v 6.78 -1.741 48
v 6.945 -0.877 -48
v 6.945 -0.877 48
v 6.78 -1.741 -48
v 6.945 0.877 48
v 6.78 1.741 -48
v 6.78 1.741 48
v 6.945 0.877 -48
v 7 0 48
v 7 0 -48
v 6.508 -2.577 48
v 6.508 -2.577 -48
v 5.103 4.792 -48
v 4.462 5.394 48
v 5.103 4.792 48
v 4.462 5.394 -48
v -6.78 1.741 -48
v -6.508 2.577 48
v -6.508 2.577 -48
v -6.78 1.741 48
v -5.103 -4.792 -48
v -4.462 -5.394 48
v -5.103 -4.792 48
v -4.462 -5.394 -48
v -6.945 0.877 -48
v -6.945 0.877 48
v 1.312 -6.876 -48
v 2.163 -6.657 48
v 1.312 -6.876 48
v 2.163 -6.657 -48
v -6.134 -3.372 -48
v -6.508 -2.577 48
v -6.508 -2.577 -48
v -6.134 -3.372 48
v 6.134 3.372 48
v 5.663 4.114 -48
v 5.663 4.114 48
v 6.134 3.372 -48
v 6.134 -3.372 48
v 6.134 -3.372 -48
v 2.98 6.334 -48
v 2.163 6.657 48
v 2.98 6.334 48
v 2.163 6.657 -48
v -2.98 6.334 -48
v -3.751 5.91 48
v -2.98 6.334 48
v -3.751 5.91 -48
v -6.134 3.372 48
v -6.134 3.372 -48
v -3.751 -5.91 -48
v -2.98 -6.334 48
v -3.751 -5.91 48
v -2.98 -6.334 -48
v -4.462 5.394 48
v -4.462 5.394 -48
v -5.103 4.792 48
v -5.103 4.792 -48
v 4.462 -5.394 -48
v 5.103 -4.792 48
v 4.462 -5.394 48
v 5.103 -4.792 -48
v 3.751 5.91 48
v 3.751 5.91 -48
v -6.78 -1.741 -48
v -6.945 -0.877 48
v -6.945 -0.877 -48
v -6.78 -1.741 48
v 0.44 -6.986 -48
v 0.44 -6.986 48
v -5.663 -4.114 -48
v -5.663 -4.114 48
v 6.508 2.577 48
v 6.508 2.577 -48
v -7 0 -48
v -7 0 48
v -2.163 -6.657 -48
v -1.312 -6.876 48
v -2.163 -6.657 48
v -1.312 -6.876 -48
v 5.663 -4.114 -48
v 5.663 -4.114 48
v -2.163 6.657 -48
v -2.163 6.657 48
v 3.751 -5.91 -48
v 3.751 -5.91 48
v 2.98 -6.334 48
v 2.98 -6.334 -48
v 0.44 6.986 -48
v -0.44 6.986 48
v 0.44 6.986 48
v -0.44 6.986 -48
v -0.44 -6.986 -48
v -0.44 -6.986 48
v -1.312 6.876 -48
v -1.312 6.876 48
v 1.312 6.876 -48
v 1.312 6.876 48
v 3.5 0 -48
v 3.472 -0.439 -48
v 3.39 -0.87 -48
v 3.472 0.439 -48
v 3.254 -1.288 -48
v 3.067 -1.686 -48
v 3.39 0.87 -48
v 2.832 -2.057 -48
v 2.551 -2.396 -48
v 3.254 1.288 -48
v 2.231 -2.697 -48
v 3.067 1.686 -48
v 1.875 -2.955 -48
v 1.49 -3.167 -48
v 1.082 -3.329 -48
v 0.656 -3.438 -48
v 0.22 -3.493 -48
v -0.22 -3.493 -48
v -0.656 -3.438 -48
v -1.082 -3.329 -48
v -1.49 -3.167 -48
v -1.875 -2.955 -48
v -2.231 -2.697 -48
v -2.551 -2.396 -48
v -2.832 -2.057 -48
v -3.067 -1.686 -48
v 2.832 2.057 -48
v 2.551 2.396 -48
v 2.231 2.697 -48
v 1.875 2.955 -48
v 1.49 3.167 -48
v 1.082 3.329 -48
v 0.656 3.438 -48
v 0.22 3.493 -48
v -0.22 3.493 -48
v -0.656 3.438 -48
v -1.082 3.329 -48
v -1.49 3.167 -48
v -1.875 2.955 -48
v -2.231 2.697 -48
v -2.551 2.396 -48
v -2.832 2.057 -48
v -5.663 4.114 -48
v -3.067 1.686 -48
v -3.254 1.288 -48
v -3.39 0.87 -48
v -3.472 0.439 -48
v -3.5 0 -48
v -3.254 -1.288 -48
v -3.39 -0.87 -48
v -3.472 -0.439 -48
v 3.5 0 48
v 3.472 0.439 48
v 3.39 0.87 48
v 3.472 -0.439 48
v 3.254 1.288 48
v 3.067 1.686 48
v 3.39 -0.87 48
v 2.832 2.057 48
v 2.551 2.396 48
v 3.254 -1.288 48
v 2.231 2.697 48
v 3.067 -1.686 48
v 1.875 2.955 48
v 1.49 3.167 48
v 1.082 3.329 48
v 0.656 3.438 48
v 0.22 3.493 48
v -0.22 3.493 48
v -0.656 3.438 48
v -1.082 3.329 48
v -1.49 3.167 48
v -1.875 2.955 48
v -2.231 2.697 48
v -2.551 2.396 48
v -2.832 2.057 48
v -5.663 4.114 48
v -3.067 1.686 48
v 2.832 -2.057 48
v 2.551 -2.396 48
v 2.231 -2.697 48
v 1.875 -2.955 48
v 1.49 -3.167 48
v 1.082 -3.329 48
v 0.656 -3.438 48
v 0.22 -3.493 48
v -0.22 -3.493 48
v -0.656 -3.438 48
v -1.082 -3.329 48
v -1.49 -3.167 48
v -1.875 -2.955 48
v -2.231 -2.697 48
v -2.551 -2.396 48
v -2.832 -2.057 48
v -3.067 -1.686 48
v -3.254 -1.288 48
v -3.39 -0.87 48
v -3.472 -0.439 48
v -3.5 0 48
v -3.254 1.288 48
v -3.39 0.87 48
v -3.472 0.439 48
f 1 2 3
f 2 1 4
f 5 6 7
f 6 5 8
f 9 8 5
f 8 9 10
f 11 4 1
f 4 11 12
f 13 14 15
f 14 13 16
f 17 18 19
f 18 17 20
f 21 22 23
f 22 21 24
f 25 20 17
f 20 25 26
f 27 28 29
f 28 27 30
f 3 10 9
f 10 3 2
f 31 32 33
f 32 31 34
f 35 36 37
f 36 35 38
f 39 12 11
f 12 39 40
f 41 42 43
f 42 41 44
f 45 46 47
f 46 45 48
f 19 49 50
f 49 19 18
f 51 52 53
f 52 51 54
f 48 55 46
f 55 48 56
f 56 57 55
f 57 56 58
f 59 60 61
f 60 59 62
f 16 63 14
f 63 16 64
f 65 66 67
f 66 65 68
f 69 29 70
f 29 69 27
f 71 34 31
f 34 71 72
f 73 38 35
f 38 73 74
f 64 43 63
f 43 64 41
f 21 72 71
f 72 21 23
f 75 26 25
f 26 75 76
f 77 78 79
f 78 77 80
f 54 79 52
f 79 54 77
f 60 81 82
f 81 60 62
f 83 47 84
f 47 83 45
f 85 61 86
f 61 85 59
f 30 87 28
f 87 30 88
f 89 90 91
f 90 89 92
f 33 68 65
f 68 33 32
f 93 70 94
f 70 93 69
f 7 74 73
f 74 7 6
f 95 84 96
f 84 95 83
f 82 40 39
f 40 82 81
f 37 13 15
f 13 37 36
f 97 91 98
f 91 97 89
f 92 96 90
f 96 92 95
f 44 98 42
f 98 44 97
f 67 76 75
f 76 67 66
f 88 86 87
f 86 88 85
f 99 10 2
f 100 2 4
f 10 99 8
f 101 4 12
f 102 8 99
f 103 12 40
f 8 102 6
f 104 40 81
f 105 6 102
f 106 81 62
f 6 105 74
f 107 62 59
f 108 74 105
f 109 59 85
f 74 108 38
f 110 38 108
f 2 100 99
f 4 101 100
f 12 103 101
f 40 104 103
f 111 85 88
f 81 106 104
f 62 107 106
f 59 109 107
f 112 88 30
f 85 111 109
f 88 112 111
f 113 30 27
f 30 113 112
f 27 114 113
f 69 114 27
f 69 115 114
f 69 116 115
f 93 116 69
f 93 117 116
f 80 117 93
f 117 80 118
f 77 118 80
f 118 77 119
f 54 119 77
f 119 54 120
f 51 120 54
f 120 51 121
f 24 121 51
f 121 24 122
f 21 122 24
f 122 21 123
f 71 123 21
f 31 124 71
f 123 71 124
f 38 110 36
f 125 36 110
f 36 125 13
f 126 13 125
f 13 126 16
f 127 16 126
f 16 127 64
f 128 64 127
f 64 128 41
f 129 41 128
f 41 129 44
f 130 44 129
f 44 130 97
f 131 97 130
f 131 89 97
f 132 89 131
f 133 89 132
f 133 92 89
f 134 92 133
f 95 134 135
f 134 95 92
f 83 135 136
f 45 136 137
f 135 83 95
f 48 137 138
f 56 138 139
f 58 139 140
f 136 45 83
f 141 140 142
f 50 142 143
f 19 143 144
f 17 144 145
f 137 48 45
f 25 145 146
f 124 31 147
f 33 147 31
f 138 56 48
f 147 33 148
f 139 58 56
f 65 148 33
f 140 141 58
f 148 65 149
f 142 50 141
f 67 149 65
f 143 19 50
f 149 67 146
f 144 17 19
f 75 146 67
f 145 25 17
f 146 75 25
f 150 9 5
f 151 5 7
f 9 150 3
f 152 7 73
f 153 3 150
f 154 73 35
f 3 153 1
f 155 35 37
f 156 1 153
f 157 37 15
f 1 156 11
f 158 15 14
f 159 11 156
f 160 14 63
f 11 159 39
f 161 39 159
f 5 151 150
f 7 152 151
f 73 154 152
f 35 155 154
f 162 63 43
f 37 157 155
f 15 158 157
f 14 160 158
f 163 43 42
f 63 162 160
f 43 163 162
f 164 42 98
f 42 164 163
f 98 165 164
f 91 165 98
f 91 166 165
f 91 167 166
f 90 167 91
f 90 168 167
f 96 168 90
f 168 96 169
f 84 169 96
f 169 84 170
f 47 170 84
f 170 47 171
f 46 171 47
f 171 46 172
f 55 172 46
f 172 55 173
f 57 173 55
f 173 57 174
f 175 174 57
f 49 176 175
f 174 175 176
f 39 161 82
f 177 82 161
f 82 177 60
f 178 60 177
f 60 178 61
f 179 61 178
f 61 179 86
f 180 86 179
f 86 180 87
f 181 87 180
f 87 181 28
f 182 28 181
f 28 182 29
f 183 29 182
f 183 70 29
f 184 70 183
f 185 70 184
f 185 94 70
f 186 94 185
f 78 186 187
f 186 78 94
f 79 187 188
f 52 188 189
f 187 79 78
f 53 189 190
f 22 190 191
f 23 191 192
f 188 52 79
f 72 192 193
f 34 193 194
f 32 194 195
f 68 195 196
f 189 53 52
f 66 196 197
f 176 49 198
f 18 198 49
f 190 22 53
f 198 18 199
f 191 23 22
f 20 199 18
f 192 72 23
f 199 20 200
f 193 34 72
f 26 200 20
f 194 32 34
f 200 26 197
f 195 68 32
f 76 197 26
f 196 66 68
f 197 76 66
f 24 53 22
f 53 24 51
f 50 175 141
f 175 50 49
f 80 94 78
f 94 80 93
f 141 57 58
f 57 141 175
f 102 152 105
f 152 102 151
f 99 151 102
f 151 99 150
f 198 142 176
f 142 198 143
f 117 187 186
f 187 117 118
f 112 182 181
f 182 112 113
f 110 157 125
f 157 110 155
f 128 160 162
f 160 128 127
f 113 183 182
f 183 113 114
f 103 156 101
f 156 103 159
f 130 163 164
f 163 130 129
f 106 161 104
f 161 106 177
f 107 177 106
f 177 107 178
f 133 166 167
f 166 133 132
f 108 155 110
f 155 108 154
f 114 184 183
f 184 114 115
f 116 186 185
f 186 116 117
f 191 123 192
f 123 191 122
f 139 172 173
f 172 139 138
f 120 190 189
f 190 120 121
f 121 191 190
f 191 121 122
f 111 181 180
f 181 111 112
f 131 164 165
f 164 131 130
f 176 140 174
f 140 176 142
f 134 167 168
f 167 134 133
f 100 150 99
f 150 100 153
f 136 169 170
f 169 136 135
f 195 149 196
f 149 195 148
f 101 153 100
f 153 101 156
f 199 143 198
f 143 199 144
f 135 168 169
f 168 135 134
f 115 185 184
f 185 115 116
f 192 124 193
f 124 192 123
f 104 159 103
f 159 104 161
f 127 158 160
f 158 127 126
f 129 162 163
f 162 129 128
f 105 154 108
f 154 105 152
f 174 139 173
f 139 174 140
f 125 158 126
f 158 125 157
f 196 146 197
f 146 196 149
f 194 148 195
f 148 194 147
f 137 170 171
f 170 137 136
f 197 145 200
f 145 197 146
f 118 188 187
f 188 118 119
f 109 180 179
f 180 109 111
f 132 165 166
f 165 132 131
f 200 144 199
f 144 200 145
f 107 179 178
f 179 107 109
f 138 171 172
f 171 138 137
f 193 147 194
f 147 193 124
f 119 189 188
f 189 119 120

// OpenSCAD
$fn = 50;


difference() {
	union() {
		translate(v = [0, 0, -48.0000000000]) {
			cylinder(h = 96, r = 7.0000000000);
		}
	}
	union() {
		translate(v = [0, 0, -100.0000000000]) {
			cylinder(h = 200, r = 3.5000000000);
		}
	}
}
